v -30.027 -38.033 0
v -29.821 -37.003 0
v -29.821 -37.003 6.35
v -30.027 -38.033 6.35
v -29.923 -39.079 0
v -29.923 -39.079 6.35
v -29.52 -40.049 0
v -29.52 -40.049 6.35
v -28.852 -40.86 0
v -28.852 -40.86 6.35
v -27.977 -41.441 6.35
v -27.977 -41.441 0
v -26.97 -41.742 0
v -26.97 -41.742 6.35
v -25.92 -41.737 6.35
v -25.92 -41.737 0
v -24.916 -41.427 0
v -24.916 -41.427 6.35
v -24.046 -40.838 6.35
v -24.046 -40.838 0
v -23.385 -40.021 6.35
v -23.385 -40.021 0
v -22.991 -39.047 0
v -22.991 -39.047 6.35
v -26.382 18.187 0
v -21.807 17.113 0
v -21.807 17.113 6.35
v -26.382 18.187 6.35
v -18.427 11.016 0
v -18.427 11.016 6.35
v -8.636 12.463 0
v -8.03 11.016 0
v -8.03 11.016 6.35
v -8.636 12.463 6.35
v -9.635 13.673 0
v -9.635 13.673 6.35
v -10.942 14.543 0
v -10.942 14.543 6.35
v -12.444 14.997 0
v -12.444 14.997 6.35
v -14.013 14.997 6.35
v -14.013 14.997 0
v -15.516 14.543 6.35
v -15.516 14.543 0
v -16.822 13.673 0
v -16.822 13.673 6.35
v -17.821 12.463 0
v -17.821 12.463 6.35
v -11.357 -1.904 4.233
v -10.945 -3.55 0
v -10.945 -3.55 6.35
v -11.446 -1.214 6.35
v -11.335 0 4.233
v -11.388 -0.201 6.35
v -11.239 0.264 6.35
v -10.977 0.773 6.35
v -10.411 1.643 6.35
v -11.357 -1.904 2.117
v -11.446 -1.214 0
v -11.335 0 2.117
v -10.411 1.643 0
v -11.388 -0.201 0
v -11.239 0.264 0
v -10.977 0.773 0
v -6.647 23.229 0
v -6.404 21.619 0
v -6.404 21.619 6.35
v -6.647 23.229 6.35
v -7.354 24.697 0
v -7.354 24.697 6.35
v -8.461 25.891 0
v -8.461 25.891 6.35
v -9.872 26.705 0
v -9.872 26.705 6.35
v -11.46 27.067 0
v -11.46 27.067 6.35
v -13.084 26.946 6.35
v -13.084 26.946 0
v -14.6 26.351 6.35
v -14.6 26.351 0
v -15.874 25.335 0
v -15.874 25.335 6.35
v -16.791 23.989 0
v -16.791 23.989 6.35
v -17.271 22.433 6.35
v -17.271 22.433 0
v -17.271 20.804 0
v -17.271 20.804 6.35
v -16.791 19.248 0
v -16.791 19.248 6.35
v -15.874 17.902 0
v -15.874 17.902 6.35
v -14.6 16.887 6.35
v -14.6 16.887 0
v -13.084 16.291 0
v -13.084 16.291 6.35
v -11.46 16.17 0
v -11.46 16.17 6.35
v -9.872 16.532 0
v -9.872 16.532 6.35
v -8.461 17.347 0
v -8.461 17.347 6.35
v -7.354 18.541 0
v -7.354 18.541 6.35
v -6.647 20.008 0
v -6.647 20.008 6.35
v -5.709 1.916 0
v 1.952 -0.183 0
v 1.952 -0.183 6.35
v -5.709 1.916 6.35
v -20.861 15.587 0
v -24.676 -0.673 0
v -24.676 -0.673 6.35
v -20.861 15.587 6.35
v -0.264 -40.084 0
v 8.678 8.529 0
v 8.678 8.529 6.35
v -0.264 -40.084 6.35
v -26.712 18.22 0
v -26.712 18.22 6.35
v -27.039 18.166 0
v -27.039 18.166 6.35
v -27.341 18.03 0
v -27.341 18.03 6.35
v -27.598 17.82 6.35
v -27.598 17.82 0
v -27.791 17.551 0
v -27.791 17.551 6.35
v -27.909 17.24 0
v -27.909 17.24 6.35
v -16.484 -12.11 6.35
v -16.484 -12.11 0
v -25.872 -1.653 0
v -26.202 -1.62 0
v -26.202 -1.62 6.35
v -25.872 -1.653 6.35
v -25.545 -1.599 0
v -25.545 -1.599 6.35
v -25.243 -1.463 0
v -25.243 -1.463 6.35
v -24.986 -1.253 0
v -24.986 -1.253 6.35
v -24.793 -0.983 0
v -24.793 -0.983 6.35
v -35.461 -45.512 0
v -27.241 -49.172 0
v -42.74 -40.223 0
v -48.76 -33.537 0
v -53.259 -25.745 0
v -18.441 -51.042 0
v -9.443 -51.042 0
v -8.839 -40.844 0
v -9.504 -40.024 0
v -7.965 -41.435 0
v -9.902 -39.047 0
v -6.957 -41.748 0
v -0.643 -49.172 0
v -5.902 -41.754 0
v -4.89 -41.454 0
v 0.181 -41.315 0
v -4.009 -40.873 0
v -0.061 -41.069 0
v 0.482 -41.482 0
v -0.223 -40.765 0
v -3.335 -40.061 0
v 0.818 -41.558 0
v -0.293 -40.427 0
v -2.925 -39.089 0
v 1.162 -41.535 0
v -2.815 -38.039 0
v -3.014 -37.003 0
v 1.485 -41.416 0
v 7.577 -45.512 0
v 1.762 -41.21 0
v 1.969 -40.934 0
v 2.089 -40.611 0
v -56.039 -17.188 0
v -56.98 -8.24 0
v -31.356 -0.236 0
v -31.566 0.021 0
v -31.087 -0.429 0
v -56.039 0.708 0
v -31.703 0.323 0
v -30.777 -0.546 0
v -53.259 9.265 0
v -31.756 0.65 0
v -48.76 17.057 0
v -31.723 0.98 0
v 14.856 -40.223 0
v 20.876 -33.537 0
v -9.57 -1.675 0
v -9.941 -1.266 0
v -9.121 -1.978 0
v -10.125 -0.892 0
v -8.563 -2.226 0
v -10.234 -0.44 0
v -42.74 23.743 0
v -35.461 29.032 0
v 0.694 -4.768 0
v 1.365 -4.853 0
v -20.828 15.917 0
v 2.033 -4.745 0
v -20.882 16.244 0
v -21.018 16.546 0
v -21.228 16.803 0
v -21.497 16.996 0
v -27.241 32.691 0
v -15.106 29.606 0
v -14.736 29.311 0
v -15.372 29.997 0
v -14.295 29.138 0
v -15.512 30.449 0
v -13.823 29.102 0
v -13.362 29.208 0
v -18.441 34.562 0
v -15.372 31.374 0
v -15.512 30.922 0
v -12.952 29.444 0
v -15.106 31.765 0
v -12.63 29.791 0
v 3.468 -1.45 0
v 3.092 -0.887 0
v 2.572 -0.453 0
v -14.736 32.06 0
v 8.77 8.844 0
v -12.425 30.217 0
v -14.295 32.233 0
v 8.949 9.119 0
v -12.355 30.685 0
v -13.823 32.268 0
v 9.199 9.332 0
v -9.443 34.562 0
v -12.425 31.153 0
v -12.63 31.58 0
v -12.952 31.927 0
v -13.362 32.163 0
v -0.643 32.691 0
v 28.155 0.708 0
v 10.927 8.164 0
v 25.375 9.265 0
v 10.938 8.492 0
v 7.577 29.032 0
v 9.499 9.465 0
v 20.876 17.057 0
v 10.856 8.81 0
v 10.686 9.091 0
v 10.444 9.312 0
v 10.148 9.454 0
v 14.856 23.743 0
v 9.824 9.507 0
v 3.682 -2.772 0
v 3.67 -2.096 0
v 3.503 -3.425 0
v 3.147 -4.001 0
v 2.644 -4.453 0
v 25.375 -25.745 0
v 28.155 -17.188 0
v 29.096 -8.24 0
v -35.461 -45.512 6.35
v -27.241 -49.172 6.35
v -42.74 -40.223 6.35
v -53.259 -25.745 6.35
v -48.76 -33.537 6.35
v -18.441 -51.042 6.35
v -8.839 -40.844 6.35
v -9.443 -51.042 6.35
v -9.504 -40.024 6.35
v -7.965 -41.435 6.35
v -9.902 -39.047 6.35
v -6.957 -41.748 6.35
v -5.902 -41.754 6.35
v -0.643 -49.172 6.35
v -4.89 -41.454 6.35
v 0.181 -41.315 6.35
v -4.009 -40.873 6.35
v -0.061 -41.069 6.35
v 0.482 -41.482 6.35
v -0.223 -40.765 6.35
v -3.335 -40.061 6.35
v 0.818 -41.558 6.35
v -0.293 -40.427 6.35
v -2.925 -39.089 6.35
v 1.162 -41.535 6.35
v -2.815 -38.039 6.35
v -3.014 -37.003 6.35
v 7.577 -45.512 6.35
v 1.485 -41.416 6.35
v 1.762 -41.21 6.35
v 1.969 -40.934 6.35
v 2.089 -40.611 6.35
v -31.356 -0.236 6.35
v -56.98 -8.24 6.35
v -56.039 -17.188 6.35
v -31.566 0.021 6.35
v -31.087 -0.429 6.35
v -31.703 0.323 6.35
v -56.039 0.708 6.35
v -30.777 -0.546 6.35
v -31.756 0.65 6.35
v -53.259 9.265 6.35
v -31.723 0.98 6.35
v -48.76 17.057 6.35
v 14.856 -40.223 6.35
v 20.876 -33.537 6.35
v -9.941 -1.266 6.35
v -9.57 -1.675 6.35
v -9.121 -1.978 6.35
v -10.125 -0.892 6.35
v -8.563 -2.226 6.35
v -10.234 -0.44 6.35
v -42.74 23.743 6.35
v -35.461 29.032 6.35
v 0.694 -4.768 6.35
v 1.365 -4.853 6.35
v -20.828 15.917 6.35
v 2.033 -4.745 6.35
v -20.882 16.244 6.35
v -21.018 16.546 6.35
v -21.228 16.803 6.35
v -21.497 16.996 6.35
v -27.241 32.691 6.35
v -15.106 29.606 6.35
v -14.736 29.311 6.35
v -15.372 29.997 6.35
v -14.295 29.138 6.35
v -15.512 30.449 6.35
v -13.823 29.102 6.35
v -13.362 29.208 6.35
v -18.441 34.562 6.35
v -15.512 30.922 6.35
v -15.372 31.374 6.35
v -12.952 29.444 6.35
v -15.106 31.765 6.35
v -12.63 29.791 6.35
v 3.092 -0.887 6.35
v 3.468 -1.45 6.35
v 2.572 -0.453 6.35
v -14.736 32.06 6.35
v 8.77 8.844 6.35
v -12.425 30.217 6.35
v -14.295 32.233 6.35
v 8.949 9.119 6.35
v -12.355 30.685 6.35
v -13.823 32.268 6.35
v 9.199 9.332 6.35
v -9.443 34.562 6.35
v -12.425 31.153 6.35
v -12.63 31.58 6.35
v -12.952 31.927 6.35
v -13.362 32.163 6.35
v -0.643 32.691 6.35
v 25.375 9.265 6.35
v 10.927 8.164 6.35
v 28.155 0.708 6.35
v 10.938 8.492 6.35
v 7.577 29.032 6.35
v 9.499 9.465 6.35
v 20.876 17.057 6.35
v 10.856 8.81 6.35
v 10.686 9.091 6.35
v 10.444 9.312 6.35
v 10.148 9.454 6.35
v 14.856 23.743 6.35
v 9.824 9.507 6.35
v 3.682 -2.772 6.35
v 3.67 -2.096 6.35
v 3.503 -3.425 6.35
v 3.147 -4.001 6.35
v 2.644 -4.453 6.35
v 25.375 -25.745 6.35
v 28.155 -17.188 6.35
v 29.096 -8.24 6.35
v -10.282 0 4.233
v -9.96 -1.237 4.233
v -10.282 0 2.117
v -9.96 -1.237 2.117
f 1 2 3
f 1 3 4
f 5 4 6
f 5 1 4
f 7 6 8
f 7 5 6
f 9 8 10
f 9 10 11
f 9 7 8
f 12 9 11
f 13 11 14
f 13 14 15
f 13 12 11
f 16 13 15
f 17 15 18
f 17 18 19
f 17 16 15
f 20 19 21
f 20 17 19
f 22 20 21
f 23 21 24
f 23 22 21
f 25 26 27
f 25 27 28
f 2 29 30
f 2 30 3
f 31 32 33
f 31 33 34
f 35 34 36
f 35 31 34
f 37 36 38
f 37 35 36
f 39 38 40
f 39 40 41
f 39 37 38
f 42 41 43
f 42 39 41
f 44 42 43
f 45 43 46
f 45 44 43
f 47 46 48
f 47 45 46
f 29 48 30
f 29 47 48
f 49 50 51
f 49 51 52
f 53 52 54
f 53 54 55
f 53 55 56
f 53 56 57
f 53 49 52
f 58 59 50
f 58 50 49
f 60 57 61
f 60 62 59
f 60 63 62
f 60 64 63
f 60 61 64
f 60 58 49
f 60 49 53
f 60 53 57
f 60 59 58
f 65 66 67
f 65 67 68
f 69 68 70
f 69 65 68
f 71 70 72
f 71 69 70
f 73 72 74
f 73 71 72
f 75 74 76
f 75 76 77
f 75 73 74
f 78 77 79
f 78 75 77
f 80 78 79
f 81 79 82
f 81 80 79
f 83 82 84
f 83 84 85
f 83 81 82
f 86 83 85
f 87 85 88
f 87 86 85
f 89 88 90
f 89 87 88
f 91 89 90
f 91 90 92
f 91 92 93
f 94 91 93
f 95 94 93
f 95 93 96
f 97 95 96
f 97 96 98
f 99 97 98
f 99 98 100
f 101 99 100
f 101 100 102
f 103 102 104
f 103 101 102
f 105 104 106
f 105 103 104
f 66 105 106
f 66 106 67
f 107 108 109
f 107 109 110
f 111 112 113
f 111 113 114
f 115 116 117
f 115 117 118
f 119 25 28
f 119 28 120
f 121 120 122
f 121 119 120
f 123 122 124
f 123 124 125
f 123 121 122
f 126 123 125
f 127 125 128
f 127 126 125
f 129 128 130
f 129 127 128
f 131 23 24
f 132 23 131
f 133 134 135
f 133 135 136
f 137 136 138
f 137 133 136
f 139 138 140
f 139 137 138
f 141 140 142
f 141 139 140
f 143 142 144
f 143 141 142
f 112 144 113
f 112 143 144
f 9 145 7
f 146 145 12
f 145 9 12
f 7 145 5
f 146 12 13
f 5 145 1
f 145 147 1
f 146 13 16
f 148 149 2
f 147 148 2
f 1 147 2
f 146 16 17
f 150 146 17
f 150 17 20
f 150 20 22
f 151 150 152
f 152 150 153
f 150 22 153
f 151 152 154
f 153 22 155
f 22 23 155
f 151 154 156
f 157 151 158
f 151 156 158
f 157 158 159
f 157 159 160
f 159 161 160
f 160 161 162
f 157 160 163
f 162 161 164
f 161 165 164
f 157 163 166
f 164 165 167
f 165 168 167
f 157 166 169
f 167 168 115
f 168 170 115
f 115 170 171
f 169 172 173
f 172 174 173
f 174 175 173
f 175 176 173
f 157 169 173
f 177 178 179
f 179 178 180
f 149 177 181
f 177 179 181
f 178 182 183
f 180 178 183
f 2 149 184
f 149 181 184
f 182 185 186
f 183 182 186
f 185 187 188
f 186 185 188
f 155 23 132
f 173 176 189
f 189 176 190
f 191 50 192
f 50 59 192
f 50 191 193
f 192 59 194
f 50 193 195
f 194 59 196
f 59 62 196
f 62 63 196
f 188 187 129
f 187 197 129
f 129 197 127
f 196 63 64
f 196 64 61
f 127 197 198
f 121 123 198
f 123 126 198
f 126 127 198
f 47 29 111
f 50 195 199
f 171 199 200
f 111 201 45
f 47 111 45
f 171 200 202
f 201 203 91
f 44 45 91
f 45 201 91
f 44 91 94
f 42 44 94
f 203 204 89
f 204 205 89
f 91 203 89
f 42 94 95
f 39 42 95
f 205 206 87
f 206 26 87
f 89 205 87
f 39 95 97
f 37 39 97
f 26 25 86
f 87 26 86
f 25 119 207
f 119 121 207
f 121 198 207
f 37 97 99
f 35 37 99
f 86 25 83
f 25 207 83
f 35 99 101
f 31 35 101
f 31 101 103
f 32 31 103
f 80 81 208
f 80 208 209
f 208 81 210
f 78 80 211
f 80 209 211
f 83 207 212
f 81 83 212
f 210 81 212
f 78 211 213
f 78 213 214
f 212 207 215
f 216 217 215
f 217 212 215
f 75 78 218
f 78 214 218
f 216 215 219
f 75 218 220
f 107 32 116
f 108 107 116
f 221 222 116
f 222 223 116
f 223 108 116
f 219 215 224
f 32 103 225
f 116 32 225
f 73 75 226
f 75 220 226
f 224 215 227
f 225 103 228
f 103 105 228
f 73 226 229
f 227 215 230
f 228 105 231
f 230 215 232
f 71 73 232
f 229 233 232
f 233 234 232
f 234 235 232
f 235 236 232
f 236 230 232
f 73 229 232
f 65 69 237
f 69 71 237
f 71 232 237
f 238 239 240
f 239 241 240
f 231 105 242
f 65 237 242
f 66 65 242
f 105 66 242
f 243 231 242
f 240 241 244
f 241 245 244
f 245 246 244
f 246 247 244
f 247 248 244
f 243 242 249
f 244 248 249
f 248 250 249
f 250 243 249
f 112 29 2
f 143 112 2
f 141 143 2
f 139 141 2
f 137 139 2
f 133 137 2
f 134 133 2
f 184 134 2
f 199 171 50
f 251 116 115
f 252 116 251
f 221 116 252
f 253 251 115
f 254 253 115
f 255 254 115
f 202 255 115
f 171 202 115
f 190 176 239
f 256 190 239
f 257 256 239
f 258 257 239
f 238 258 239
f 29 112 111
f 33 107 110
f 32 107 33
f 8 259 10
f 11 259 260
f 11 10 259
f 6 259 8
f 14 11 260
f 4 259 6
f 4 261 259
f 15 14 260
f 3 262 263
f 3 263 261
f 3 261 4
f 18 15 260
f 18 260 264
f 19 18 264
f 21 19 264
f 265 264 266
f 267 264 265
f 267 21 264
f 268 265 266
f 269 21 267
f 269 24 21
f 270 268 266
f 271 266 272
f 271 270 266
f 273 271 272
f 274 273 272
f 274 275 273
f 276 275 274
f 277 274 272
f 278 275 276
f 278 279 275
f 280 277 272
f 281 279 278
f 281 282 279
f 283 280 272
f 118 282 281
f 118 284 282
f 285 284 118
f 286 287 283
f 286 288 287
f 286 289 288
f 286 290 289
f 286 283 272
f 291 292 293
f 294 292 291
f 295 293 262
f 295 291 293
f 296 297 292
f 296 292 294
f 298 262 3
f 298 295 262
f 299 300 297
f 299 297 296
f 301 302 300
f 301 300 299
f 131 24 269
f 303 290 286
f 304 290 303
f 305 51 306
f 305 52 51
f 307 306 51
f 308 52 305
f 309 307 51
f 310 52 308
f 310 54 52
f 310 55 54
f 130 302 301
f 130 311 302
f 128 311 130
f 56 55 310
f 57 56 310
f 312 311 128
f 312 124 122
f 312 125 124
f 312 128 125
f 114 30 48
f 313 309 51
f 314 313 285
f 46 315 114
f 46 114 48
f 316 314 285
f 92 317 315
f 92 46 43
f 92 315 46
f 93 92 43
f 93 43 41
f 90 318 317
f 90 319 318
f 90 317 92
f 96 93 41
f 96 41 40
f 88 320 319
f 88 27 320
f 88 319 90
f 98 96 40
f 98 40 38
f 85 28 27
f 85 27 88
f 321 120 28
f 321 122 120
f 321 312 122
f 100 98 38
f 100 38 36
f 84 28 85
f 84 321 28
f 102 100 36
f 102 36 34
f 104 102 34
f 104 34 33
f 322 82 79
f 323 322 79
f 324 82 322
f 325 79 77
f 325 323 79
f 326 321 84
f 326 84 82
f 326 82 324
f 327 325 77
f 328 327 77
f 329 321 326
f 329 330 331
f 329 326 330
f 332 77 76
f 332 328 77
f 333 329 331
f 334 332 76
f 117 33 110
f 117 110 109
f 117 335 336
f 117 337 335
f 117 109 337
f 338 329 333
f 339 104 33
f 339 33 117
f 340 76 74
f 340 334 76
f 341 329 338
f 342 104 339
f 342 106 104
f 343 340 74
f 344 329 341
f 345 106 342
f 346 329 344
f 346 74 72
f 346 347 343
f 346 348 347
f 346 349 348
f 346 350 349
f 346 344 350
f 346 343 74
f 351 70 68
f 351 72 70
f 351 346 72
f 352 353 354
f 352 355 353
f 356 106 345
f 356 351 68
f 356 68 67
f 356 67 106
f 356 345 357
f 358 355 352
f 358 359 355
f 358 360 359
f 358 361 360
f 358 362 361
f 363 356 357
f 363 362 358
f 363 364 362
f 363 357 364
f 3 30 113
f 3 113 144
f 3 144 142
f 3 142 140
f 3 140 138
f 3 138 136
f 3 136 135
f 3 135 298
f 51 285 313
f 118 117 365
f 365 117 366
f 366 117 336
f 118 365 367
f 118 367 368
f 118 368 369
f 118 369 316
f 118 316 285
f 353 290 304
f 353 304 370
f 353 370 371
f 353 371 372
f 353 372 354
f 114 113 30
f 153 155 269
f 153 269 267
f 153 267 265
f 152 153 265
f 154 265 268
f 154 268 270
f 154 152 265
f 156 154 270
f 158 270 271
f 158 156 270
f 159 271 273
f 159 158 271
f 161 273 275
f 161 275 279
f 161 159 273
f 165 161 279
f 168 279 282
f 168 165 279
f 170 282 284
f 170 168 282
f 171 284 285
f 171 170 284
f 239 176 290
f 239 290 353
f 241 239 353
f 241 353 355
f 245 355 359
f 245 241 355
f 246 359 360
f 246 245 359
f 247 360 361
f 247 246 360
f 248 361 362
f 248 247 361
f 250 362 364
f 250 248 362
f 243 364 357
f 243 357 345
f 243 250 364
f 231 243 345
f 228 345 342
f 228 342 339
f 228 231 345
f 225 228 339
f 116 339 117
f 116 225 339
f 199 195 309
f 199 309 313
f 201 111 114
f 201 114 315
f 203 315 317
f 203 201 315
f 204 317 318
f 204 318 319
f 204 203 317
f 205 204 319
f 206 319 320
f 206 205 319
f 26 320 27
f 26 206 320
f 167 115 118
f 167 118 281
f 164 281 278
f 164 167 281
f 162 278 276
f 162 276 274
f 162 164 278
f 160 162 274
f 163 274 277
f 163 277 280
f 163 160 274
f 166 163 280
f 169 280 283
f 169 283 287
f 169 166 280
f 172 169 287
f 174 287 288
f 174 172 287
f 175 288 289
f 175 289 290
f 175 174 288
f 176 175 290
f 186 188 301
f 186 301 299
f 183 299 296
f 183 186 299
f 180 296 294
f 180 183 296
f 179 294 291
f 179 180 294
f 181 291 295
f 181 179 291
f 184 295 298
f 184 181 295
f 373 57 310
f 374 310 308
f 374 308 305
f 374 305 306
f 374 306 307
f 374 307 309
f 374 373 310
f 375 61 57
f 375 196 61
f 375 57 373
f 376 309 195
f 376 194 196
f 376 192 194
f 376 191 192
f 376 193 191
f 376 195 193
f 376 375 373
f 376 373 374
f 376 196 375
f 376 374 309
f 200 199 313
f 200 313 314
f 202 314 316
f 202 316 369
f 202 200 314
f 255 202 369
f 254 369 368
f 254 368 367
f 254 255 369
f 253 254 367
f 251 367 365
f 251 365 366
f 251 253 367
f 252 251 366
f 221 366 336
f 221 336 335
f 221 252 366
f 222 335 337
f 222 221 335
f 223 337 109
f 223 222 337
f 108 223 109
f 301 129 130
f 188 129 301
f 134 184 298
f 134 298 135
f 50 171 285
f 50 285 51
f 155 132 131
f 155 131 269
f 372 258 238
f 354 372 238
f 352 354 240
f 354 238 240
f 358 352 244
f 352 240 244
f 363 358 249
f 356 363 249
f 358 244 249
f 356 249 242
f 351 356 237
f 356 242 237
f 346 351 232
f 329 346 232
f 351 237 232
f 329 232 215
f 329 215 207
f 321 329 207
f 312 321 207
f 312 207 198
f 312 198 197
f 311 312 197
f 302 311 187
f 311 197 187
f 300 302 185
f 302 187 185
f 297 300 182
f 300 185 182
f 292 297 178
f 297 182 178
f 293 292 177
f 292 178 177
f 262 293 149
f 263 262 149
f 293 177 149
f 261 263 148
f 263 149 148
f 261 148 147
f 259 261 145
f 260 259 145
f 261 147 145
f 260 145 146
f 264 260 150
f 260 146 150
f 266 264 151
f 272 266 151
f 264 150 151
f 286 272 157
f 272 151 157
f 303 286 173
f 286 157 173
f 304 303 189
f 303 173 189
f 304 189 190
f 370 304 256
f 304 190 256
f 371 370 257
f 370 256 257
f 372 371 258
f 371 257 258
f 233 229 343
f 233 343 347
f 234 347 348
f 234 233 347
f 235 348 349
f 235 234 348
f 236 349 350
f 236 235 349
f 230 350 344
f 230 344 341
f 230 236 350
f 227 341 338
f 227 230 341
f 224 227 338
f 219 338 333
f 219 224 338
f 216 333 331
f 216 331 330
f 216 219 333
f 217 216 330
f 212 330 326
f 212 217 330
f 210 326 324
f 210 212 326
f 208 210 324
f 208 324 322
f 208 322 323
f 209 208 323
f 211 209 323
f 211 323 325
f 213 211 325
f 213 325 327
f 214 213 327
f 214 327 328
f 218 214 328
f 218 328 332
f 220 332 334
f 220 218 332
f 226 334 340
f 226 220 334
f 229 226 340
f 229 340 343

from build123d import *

# Parameters (mm, degrees)
F1_R     = 43.0377999141
F1_R_2   = 1.5875
F2_DEPTH = 6.35
F0_R     = 5.4640621861
F3_DEPTH = 6.35


with BuildPart() as f2:
    # F1 (on Top) → F2 (new body)
    with BuildSketch(Plane.XY):
        with Locations((-13.9420051128, -8.2401288673)):
            Circle(F1_R)
        with Locations((-13.9420051128, 30.6853711327)):
            Circle(F1_R_2, mode=Mode.SUBTRACT)
    extrude(amount=F2_DEPTH)

    # F0 (on Top) → F3 (cut)
    with BuildSketch(Plane.XY):
        with Locations((-11.8682515955, 21.6185524797)):
            Circle(F0_R)
        with BuildLine():
            Line((-30.777075401, -0.5462395027), (-26.2022968359, -1.6195531011))
            ThreePointArc((-26.2022968359, -1.6195531011), (-25.2430473169, -1.4625330212), (-24.6757854404, -0.6732112182))
            Line((-24.6757854404, -0.6732112182), (-20.8609066441, 15.5869254009))
            ThreePointArc((-20.8609066441, 15.5869254009), (-21.017926724, 16.54617492), (-21.807248527, 17.1134367965))
            Line((-21.807248527, 17.1134367965), (-26.3820270921, 18.1867503949))
            ThreePointArc((-26.3820270921, 18.1867503949), (-27.3412766111, 18.029730315), (-27.9085384876, 17.240408512))
            Line((-27.9085384876, 17.240408512), (-31.7234172839, 0.9802718929))
            ThreePointArc((-31.7234172839, 0.9802718929), (-31.566397204, 0.0210223738), (-30.777075401, -0.5462395027))
        make_face()
        with BuildLine():
            Line((-16.4839141071, -12.11008057), (-9.9019641905, -39.0468699637))
            ThreePointArc((-9.9019641905, -39.0468699637), (-5.3848753387, -41.6411280094), (-3.0142599717, -37.0027609169))
            Line((-3.0142599717, -37.0027609169), (-10.9454579651, -3.5498633515))
            add(Edge.make_bspline(
                [(-10.9454579651, -3.5498633515), (-11.1008232007, -3.029964733), (-11.4148845809, -1.9182603696), (-11.5758558718, 0.0611210161), (-10.7270246335, 1.1480561674), (-10.4112150148, 1.642682706)],
                knots=[0, 0, 0, 0, 0.3212196894, 0.6614579708, 1, 1, 1, 1], degree=3))
            add(Edge.make_bspline(
                [(-10.4112150148, 1.642682706), (-10.3324407758, 1.1105596752), (-10.3150494323, 0.00946776), (-10.1153730649, -1.3596205713), (-9.2167931712, -1.9914203558), (-8.5628340021, -2.2260230035)],
                knots=[0, 0, 0, 0, 0.3448186812, 0.6485748194, 1, 1, 1, 1], degree=3))
            Line((-8.5628340021, -2.2260230035), (0.6940379972, -4.768232815))
            ThreePointArc((0.6940379972, -4.768232815), (3.6159208044, -3.1049103484), (1.9518018235, -0.1834811119))
            Line((1.9518018235, -0.1834811119), (-5.7092916164, 1.9159893078))
            Line((-5.7092916164, 1.9159893078), (-8.030090481, 11.0155502334))
            ThreePointArc((-8.030090481, 11.0155502334), (-13.2287628949, 15.0547445073), (-18.4274353087, 11.0155502334))
            Line((-18.4274353087, 11.0155502334), (-29.8210121691, -37.0027609169))
            ThreePointArc((-29.8210121691, -37.0027609169), (-27.4845954692, -41.6285261383), (-22.9910892352, -39.0468699637))
            Line((-22.9910892352, -39.0468699637), (-16.4839141071, -12.11008057))
        make_face()
        with BuildLine():
            Line((8.6775599048, 8.5290158167), (-0.2638578007, -40.083643049))
            ThreePointArc((-0.2638578007, -40.083643049), (0.6472478334, -41.5319603397), (2.0893774927, -40.6110920012))
            Line((2.0893774927, -40.6110920012), (10.9268212691, 8.164270781))
            ThreePointArc((10.9268212691, 8.164270781), (9.9879647619, 9.4922508691), (8.6775599048, 8.5290158167))
        make_face()
    extrude(amount=F3_DEPTH, mode=Mode.SUBTRACT)


solid = f2.part
